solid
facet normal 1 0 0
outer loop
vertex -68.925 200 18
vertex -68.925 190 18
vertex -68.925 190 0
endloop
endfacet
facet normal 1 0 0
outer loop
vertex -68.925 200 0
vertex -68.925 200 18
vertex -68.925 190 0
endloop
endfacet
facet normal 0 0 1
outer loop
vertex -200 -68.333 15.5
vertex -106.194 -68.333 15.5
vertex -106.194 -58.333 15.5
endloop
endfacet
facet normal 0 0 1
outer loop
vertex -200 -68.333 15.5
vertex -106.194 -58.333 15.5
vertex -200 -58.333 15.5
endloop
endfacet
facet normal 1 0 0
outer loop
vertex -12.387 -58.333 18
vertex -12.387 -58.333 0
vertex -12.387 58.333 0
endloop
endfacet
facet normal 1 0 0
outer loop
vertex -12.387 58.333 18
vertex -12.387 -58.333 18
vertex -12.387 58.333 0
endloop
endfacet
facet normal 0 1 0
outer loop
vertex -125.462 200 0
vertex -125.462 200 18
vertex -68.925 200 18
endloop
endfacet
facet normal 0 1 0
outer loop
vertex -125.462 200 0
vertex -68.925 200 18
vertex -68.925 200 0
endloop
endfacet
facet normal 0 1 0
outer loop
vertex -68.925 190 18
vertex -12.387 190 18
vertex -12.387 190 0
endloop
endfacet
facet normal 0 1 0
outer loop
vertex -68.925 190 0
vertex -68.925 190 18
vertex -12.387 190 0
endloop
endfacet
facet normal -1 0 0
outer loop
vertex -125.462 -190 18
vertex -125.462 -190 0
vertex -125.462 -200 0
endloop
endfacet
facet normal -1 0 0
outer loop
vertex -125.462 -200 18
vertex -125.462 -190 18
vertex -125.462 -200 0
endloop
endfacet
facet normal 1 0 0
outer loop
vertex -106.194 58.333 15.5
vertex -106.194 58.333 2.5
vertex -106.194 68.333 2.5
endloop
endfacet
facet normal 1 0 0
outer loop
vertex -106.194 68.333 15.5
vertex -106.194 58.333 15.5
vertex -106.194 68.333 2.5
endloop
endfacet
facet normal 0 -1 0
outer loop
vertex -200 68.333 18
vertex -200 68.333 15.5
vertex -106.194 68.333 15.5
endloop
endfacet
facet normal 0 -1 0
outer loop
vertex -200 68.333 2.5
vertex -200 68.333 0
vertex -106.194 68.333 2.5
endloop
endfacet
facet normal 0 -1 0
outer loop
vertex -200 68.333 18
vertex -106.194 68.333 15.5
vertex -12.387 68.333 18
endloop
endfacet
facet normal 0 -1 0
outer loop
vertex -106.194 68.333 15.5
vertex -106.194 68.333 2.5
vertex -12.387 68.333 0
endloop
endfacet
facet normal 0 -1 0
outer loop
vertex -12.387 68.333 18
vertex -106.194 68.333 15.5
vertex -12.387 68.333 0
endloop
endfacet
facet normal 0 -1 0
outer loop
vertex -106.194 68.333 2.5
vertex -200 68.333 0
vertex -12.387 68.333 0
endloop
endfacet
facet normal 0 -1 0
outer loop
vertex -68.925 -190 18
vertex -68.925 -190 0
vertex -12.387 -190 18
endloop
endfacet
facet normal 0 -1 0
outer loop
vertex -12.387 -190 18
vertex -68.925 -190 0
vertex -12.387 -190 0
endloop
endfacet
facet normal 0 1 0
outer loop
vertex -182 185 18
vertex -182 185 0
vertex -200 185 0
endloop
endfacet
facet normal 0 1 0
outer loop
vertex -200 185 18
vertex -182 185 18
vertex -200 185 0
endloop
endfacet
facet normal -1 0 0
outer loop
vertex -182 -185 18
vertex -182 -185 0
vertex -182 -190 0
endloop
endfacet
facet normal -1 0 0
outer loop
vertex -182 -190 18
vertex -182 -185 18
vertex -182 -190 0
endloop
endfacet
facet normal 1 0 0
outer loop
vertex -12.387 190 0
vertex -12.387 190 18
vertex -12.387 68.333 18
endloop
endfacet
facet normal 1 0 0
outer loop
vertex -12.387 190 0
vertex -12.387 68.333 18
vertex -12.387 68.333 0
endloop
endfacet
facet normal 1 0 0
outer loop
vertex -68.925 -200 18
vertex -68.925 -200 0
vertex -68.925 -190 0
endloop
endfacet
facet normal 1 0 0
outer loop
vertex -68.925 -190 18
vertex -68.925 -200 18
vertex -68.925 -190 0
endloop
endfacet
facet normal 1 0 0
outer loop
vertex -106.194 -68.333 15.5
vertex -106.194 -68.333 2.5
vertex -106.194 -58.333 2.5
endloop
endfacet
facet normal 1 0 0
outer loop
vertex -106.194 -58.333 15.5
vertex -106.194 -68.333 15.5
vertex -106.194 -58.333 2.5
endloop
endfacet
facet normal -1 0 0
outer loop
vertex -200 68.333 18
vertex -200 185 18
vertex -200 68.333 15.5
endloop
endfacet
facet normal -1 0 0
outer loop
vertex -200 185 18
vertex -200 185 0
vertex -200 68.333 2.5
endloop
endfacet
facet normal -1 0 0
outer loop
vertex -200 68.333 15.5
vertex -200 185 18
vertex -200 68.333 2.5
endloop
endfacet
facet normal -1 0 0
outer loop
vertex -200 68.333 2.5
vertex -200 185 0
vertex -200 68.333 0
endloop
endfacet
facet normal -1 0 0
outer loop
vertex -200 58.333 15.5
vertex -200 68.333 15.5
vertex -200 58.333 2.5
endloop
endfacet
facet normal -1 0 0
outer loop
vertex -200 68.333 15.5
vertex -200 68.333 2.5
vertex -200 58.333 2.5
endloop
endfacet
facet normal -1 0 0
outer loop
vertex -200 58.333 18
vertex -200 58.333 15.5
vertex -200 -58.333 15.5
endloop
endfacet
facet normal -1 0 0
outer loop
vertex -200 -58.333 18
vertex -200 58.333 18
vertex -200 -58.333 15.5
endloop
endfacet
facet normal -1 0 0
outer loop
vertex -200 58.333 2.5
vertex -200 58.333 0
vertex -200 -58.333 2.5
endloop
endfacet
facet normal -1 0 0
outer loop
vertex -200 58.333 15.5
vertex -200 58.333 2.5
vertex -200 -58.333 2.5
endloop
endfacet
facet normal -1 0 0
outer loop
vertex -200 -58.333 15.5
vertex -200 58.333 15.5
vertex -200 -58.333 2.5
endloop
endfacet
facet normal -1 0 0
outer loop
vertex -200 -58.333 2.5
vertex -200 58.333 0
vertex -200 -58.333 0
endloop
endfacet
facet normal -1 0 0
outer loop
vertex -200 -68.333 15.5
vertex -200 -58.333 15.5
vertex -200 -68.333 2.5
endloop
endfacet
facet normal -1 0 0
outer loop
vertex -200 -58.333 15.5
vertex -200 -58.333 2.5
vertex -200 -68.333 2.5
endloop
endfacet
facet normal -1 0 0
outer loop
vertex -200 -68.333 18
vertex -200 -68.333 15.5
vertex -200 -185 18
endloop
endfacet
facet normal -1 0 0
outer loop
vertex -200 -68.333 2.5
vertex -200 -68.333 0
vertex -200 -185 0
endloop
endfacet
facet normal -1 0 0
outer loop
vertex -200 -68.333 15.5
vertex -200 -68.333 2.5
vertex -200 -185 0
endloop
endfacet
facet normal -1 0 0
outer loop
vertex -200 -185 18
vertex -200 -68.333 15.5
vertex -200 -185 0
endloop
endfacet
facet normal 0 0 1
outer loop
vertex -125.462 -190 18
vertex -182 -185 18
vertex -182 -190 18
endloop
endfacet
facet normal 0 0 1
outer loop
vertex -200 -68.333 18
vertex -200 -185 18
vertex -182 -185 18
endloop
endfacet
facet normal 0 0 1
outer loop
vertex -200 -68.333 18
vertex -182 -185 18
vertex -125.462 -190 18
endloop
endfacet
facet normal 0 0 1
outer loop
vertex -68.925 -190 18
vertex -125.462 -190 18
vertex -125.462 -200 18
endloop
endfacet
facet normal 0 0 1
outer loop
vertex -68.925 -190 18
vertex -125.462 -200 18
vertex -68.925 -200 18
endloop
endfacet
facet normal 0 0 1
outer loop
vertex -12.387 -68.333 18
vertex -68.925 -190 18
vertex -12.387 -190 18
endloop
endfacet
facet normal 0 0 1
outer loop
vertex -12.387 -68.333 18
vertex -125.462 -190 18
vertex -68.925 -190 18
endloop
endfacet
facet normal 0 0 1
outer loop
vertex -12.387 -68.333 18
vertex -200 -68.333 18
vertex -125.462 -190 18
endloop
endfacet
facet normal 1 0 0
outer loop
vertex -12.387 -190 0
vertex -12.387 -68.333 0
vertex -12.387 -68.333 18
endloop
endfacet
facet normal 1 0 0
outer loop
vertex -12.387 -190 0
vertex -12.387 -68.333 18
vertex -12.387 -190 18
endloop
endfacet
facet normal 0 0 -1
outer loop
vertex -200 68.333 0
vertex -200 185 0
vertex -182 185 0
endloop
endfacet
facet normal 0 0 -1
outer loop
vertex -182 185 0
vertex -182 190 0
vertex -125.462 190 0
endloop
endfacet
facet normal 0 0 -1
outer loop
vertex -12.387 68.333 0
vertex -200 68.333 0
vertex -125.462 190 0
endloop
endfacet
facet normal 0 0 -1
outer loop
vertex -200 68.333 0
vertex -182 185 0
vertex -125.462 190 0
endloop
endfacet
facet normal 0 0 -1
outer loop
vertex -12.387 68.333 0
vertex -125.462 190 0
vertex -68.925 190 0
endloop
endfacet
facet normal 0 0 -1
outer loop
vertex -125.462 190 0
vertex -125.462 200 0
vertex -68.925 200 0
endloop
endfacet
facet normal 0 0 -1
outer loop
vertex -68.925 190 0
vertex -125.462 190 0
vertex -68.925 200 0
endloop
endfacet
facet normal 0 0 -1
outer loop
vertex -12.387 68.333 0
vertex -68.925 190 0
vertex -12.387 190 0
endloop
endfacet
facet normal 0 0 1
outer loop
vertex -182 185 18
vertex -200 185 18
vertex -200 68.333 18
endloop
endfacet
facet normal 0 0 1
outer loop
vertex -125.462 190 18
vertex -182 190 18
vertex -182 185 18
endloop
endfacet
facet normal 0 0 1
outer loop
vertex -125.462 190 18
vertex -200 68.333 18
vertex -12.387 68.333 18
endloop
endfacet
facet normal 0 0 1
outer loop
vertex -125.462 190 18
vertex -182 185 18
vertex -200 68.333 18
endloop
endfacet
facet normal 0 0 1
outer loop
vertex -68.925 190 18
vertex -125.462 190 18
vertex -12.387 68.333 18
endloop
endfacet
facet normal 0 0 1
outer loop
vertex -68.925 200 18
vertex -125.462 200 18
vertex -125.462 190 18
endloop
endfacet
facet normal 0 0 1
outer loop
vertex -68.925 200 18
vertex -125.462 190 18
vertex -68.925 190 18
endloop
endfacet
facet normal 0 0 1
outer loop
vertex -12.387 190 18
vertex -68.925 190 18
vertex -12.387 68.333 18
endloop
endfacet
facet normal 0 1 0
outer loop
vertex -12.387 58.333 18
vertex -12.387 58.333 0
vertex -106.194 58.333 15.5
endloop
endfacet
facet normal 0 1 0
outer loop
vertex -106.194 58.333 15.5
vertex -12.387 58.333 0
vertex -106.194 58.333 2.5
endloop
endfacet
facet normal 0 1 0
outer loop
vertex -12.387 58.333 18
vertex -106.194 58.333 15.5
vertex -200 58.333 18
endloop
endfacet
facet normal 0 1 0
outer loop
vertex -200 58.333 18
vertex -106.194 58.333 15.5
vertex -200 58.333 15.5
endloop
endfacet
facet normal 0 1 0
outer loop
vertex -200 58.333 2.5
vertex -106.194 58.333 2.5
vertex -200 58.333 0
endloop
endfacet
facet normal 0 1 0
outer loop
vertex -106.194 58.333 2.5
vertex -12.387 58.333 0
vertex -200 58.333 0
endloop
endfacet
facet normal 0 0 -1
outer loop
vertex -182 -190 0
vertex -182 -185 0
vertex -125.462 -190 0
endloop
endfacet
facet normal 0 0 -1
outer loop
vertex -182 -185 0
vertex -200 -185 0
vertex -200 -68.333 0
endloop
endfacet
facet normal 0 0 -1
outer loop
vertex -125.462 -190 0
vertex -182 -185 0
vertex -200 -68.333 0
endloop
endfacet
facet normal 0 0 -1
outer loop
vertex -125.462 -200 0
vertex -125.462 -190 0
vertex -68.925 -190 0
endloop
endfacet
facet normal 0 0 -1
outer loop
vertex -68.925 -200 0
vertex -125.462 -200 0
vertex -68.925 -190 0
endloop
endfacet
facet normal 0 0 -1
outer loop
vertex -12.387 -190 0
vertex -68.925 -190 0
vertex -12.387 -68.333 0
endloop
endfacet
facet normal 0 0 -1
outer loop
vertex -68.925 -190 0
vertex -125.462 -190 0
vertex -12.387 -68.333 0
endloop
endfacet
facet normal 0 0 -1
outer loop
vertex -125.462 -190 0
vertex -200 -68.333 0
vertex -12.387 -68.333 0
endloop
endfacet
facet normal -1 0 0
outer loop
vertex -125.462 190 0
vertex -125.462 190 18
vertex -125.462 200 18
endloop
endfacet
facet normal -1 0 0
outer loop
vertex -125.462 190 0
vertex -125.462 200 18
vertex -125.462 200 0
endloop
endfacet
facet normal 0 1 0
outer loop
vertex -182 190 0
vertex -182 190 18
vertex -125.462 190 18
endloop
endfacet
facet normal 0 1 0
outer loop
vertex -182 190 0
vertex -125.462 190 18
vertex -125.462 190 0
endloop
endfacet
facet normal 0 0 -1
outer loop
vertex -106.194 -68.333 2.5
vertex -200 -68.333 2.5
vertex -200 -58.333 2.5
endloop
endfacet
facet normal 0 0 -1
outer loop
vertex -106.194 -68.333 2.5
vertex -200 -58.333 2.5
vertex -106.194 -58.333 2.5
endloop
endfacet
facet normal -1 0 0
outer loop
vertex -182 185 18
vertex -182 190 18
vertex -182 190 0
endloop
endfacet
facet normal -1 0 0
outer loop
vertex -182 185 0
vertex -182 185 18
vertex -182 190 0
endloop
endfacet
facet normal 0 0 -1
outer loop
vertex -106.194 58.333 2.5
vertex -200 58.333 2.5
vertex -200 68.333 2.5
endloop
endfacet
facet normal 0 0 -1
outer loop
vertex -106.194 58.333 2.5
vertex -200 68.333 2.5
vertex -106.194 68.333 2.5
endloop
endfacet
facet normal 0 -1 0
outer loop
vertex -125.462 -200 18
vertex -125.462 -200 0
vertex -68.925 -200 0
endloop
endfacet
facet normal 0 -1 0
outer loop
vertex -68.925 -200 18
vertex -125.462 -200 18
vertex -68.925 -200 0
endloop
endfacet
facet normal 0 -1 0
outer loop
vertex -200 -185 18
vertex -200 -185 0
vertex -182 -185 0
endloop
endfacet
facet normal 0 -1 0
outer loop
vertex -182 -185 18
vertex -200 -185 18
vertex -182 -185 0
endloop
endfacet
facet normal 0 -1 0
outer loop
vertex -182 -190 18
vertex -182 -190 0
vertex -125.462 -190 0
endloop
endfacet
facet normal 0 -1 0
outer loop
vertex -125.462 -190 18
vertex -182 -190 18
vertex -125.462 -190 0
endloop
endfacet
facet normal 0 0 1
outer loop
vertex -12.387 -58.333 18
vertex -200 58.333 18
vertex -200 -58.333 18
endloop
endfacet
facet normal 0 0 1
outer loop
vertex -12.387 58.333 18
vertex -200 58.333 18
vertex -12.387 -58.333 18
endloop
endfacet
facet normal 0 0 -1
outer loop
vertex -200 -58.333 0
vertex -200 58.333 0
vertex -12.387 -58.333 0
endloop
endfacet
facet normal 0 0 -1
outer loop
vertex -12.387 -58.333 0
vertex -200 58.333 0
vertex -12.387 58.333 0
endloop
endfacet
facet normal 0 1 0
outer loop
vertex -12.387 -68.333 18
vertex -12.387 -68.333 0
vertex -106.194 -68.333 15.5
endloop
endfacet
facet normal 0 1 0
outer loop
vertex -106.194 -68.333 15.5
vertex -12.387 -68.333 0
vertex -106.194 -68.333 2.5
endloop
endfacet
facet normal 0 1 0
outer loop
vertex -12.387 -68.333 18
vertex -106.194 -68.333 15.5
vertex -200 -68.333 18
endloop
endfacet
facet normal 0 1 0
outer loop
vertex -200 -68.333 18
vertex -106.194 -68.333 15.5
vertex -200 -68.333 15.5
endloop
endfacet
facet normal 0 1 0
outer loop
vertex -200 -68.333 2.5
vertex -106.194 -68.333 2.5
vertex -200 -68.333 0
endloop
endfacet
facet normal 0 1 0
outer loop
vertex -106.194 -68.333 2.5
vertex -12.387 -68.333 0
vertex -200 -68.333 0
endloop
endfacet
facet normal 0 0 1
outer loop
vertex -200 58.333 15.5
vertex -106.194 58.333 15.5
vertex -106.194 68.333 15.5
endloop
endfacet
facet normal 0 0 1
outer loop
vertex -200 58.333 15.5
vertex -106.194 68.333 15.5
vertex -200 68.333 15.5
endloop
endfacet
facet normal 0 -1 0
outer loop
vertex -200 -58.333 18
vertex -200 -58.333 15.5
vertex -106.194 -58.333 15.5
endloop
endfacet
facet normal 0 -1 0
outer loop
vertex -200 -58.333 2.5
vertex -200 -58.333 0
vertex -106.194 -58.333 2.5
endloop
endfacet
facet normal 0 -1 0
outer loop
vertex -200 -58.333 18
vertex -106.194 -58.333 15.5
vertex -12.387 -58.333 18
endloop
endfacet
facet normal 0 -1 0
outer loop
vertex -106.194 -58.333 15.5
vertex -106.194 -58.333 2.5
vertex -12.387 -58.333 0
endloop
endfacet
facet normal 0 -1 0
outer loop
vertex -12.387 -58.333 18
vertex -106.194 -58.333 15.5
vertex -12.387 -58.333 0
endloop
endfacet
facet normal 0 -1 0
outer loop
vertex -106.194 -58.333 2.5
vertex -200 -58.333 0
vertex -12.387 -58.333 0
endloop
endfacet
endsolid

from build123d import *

# Parameters (mm, degrees)
SKETCH004_W              = 18
SKETCH004_H              = 169.6125627158
PAD003_DEPTH             = 5
SKETCH005_W              = 18
SKETCH005_H              = 56.5375209053
PAD004_DEPTH             = 10
PAD005_DEPTH             = 18
SKETCH007_W              = 93.8062813579
SKETCH007_H              = 10
POCKET_DEPTH             = 2.5
SKETCH008_W              = 93.8062813579
SKETCH008_H              = 10
POCKET001_DEPTH          = 2.5
CLONE024_PITCH_ANGLE     = 90
CLONE024_PLACEMENT_ANGLE = -90


with BuildPart() as part:
    # Sketch004 → Pad003 (new body)
    with BuildSketch(Plane.XY):
        with Locations((0, -97.1937186421)):
            Rectangle(SKETCH004_W, SKETCH004_H)
    extrude(amount=PAD003_DEPTH)

    # Sketch005 (on Face5 of Pad003) → Pad004 (join)
    with BuildSketch(Plane(origin=(0, 0, 0), x_dir=(1, 0, 0), z_dir=(0, 0, -1))):
        with Locations((0, 97.1937186421)):
            Rectangle(SKETCH005_W, SKETCH005_H)
    extrude(amount=PAD004_DEPTH)

    # Sketch006 (on Face9 of Pad004) → Pad005 (join)
    with BuildSketch(Plane.YZ.offset(9)):
        Polygon((-12.3874372842, 0), (-68.9249581895, 0), (-68.9249581895, -10), (-125.4624790947, -10), (-125.4624790947, 0), (-182, 0), (-182, 5), (-200, 5), (-200, 375), (-182, 375), (-182, 380), (-125.4624790947, 380), (-125.4624790947, 390), (-68.9249581895, 390), (-68.9249581895, 380), (-12.3874372842, 380), (-12.3874372842, 375), (-12.3874372842, 258.3333333333), (-106.1937186421, 258.3333333333), (-106.1937186421, 248.3333333333), (-12.3874372842, 248.3333333333), (-12.3874372842, 131.6666666667), (-106.1937186421, 131.6666666667), (-106.1937186421, 121.6666666667), (-12.3874372842, 121.6666666667), (-12.3874372842, 5), align=None)
    extrude(amount=-PAD005_DEPTH)

    # Sketch007 (on Face11 of Pad005) → Pocket (cut)
    with BuildSketch(Plane.YZ.offset(9)):
        with Locations((-153.0968593211, 253.3333333333)):
            Rectangle(SKETCH007_W, SKETCH007_H)
        with Locations((-153.0968593211, 126.6666666667)):
            Rectangle(SKETCH007_W, SKETCH007_H)
    extrude(amount=-POCKET_DEPTH, mode=Mode.SUBTRACT)

    # Sketch008 (on Face9 of Pocket) → Pocket001 (cut)
    with BuildSketch(Plane(origin=(-9, 0, 0), x_dir=(0, -1, 0), z_dir=(-1, 0, 0))):
        with Locations((153.0968593211, 126.6666666667)):
            Rectangle(SKETCH008_W, SKETCH008_H)
        with Locations((153.0968593211, 253.3333333333)):
            Rectangle(SKETCH008_W, SKETCH008_H)
    extrude(amount=-POCKET001_DEPTH, mode=Mode.SUBTRACT)


with BuildPart() as part_1:
    # Body004 placement: moved
    add(part.part.moved(Location((0, 0, 13))))


with BuildPart() as part_2:
    # Clone024 pitch: moved
    add(part_1.part.rotate(Axis((0, 0, 0), (0, 1, 0)), CLONE024_PITCH_ANGLE))


with BuildPart() as part_3:
    # Clone024 placement: moved
    add(part_2.part.moved(Location((0, 203, 9))).rotate(Axis((0, 203, 9), (0, 0, 1)), CLONE024_PLACEMENT_ANGLE))


solid = part_3.part
